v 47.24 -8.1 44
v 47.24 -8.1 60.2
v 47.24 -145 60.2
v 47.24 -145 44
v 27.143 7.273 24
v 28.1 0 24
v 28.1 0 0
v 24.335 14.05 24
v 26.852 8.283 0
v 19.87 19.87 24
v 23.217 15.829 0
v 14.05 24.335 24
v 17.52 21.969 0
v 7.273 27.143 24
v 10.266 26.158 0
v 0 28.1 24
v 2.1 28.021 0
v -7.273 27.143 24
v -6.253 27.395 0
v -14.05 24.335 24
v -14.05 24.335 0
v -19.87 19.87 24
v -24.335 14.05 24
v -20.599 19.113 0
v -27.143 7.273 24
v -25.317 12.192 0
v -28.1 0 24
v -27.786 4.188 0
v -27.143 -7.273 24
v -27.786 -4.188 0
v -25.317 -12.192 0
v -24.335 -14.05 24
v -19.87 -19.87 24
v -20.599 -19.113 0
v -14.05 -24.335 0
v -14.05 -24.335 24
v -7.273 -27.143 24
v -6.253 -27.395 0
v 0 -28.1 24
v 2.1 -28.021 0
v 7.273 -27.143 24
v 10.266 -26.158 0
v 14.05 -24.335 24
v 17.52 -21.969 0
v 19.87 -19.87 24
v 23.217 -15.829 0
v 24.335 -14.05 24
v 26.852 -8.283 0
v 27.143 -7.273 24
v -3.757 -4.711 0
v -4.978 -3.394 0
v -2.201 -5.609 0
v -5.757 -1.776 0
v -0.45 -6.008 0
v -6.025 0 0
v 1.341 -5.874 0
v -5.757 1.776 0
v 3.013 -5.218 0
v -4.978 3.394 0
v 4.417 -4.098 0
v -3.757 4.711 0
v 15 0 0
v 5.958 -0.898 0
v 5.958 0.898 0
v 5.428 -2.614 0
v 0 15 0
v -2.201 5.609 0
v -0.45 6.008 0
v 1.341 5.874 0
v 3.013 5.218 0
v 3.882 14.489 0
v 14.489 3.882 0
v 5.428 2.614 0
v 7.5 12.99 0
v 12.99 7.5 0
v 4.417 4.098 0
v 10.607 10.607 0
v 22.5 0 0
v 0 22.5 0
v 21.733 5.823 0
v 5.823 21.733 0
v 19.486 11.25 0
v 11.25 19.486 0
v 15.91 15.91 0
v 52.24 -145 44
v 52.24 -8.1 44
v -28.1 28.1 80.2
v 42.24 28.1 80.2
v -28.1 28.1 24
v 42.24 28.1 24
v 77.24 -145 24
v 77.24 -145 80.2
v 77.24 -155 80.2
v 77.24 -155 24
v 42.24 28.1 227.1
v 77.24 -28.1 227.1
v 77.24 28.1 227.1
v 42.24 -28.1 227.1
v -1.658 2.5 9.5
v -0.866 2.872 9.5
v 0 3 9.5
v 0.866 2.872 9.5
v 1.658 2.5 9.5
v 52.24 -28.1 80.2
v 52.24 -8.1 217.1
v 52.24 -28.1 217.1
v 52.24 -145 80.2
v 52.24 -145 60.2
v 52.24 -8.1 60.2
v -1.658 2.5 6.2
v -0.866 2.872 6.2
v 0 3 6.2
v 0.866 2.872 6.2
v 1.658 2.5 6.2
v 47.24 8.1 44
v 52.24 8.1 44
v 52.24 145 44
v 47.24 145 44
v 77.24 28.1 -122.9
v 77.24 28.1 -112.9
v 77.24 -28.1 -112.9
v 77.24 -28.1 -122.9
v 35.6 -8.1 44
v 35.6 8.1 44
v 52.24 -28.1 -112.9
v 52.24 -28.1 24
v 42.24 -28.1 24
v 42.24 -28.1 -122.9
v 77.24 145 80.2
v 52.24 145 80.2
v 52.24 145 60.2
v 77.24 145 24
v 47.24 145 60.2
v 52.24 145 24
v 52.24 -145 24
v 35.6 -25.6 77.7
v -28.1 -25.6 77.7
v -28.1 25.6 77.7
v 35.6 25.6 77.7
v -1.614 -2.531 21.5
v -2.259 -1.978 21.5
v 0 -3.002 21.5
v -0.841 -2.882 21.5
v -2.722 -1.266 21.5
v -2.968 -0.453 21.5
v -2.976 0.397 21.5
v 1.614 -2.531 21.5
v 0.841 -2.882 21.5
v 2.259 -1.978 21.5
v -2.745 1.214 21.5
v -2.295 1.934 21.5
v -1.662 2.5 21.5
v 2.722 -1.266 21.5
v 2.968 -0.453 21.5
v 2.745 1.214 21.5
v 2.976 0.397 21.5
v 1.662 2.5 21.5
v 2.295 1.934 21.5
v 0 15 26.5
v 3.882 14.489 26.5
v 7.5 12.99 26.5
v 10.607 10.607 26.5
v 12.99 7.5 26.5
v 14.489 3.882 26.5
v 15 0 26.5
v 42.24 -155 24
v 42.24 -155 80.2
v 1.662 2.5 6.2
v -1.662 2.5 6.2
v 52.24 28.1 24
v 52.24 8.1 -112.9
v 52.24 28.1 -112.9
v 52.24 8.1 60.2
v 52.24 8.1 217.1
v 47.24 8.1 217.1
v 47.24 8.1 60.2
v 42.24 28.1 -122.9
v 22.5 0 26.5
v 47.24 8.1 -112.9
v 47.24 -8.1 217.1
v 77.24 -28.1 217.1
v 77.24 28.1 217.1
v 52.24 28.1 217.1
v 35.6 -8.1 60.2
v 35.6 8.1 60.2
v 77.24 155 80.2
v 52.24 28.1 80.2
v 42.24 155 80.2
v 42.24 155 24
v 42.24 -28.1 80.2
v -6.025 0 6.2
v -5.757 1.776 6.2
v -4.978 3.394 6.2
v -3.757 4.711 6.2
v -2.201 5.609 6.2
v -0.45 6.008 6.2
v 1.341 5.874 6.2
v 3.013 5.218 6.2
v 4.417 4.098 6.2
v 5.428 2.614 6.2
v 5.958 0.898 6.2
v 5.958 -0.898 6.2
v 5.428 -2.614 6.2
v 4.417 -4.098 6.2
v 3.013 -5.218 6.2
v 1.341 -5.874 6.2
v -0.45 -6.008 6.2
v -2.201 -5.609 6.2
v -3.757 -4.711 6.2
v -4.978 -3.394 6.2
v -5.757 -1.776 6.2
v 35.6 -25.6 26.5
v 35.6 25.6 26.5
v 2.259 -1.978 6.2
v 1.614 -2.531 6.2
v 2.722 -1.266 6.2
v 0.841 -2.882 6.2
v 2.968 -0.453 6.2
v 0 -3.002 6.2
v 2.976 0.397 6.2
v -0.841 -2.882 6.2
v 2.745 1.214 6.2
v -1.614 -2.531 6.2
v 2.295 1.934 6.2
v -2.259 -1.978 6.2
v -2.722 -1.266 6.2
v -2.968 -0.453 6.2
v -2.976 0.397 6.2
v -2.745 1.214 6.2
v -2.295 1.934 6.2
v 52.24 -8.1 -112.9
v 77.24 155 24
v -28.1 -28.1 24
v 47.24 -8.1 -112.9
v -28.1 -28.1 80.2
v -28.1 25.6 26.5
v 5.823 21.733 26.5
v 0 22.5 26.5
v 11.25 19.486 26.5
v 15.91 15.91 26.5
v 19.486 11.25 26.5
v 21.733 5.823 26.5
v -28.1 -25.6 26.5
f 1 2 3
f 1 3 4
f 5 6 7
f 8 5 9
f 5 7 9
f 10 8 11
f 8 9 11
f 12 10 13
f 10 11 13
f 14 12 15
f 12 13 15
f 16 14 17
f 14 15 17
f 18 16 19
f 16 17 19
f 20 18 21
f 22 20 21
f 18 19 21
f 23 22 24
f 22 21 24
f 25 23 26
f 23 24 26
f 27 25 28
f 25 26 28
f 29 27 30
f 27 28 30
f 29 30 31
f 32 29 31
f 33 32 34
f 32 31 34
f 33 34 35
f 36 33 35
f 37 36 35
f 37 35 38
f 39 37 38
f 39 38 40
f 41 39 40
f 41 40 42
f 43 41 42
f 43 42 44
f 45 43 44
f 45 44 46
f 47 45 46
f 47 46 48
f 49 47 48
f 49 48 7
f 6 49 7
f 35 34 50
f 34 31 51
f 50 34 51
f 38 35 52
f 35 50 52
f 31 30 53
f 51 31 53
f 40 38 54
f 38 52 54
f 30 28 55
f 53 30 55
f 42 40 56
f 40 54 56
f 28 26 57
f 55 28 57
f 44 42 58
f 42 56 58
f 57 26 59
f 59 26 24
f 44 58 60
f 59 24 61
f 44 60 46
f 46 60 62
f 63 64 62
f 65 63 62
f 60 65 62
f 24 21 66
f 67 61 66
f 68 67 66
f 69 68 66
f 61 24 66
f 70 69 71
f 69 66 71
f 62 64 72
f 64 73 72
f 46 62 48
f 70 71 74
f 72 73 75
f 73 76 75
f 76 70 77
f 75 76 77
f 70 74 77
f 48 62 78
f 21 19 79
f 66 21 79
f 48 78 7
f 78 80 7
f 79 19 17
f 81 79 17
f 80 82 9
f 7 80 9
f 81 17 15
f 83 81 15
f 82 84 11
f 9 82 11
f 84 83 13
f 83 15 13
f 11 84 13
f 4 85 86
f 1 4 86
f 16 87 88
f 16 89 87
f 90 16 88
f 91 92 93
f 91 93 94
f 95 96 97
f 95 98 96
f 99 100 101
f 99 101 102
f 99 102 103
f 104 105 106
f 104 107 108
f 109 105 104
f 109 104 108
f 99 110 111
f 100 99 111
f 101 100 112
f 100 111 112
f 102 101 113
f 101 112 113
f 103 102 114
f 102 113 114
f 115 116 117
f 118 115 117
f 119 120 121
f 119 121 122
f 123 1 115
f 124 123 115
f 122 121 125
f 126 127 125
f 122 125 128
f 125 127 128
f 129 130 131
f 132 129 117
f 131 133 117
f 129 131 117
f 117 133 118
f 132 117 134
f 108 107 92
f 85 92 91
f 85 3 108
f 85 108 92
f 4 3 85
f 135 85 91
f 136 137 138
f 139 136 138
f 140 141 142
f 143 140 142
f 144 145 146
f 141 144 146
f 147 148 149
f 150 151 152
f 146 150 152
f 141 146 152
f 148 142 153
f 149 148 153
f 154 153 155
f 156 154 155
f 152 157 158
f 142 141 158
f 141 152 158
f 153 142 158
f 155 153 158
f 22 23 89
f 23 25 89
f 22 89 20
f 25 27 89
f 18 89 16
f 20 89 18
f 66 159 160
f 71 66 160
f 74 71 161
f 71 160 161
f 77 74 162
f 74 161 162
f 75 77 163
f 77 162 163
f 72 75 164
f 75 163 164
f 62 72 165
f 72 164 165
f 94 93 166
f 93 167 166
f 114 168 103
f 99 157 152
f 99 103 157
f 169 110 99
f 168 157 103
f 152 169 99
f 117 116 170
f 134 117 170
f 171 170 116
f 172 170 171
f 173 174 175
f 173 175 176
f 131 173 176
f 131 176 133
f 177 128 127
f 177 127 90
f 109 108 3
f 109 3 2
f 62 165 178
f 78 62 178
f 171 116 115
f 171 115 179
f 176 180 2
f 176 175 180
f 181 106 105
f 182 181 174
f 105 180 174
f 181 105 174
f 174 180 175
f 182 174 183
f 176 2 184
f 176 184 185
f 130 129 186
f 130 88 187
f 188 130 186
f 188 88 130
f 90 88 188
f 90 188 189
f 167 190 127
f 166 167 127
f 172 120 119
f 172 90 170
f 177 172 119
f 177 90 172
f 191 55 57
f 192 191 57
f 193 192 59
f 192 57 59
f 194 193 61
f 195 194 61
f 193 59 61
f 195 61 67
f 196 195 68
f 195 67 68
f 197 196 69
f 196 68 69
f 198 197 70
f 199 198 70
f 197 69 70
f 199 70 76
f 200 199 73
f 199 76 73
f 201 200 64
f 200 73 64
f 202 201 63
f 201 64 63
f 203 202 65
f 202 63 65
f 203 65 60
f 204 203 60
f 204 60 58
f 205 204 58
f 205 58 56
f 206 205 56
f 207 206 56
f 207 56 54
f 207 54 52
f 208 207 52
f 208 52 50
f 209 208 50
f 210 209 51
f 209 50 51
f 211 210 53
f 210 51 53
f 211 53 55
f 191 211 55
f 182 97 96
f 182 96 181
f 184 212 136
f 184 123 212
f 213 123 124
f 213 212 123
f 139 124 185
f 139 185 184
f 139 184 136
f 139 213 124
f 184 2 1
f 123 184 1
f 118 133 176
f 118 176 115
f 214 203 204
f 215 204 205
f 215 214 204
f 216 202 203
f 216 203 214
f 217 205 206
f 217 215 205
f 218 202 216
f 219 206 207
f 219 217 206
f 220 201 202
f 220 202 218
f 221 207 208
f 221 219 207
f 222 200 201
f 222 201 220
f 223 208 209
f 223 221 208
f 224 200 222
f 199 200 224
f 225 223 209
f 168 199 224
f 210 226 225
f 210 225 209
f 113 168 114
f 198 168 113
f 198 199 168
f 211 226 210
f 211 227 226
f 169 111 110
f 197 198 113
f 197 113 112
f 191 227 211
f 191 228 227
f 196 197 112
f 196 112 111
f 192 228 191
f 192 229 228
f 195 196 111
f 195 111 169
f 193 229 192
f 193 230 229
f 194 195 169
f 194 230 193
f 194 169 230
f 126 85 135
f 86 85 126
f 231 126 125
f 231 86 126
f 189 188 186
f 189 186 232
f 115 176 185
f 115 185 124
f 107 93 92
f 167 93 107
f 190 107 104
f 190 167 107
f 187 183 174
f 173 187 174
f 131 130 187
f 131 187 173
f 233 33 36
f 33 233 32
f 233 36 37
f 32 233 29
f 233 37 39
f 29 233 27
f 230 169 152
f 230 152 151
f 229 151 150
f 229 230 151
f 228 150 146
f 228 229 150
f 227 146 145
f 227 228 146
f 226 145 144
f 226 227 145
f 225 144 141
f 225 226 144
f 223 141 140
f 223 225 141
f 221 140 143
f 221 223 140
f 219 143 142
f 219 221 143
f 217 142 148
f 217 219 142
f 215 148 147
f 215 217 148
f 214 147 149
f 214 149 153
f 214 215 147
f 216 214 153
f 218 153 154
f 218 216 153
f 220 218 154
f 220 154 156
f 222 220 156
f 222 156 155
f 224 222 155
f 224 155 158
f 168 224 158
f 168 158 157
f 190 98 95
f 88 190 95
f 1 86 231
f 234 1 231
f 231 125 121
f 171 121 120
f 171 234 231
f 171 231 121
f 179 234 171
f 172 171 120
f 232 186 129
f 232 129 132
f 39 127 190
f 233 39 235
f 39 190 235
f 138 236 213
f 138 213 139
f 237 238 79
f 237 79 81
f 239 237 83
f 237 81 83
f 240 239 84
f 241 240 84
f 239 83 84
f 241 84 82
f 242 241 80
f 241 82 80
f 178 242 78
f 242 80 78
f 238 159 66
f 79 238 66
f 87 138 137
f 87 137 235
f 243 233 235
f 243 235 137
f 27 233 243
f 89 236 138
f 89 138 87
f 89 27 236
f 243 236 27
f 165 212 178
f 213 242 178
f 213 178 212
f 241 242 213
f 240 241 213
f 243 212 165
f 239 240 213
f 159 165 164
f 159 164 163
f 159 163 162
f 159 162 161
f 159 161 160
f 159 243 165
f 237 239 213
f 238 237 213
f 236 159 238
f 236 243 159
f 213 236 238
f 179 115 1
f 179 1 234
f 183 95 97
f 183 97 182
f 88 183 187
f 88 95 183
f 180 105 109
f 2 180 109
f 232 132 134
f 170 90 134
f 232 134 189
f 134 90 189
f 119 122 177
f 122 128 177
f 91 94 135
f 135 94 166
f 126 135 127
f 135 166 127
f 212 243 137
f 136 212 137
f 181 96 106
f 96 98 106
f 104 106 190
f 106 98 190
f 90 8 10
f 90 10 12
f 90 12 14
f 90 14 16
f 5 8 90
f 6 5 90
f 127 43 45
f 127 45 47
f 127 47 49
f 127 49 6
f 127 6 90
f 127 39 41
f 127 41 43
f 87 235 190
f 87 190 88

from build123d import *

# Parameters (mm, degrees)
SKETCH1_R            = 28.1
BOSS_EXTRUDE2_DEPTH  = 24
CUT_EXTRUDE2_DEPTH   = 21.5
SKETCH4_R            = 3
CUT_EXTRUDE3_DEPTH   = 9.5
SKETCH6_R            = 6.025
CUT_EXTRUDE4_DEPTH   = 6.2
SKETCH7_W            = 56.2
SKETCH7_H            = 56.2
BOSS_EXTRUDE3_DEPTH  = 56.2
SKETCH8_W            = 56.2
SKETCH8_H            = 56.2
BOSS_EXTRUDE4_DEPTH  = 14.14
SKETCH10_W           = 56.2
SKETCH10_H           = 56.2
BOSS_EXTRUDE5_DEPTH  = 10
SKETCH11_W           = 10
SKETCH11_H           = 56.2
BOSS_EXTRUDE6_DEPTH  = 146.9
SKETCH12_W           = 10
SKETCH12_H           = 56.2
BOSS_EXTRUDE7_DEPTH  = 126.9
SKETCH13_W           = 10
SKETCH13_H           = 56.2
BOSS_EXTRUDE8_DEPTH  = 146.9
SKETCH14_W           = 10
SKETCH14_H           = 56.2
BOSS_EXTRUDE9_DEPTH  = 126.9
SKETCH15_W           = 10
SKETCH15_H           = 56.2
BOSS_EXTRUDE10_DEPTH = 25
SKETCH16_W           = 10
SKETCH16_H           = 56.2
BOSS_EXTRUDE11_DEPTH = 25
SKETCH17_W           = 56.2
SKETCH17_H           = 10
BOSS_EXTRUDE12_DEPTH = 25
SKETCH18_W           = 56.2
SKETCH18_H           = 10
BOSS_EXTRUDE13_DEPTH = 25
SKETCH19_W           = 51.2
SKETCH19_H           = 51.2
CUT_EXTRUDE5_DEPTH   = 63.7
SKETCH23_W           = 330
SKETCH23_H           = 16.2
CUT_EXTRUDE7_DEPTH   = 5
SKETCH24_W           = 16.2
SKETCH24_H           = 290
CUT_EXTRUDE8_DEPTH   = 5
SKETCH25_W           = 16.2
SKETCH25_H           = 16.2
CUT_EXTRUDE12_DEPTH  = 25


with BuildPart() as part:
    # Sketch1 → Boss-Extrude2 (new body)
    with BuildSketch(Plane.XY):
        Circle(SKETCH1_R)
    extrude(amount=BOSS_EXTRUDE2_DEPTH)

    # Sketch3 → Cut-Extrude2 (cut)
    with BuildSketch(Plane(origin=(0, 0, 0), x_dir=(-1, 0, 0), z_dir=(0, 0, -1))):
        with BuildLine():
            Line((-1.661801922, 2.5), (1.661801922, 2.5))
            ThreePointArc((1.661801922, 2.5), (0, -3.001930317), (-1.661801922, 2.5))
        make_face()
    extrude(amount=-CUT_EXTRUDE2_DEPTH, mode=Mode.SUBTRACT)

    # Sketch4 → Cut-Extrude3 (cut)
    with BuildSketch(Plane(origin=(0, 0, 0), x_dir=(-1, 0, 0), z_dir=(0, 0, -1))):
        Circle(SKETCH4_R)
    extrude(amount=-CUT_EXTRUDE3_DEPTH, mode=Mode.SUBTRACT)

    # Sketch6 → Cut-Extrude4 (cut)
    with BuildSketch(Plane(origin=(0, 0, 0), x_dir=(-1, 0, 0), z_dir=(0, 0, -1))):
        Circle(SKETCH6_R)
    extrude(amount=-CUT_EXTRUDE4_DEPTH, mode=Mode.SUBTRACT)

    # Sketch7 → Boss-Extrude3 (add)
    with BuildSketch(Plane.XY.offset(24)):
        Rectangle(SKETCH7_W, SKETCH7_H)
    extrude(amount=BOSS_EXTRUDE3_DEPTH)

    # Sketch8 → Boss-Extrude4 (add)
    with BuildSketch(Plane(origin=(28.1, 0, 0), x_dir=(0, 0, -1), z_dir=(1, 0, 0))):
        with Locations((-52.1, 0)):
            Rectangle(SKETCH8_W, SKETCH8_H)
    extrude(amount=BOSS_EXTRUDE4_DEPTH)

    # Sketch10 → Boss-Extrude5 (add)
    with BuildSketch(Plane(origin=(42.24, 0, 0), x_dir=(0, 0, -1), z_dir=(1, 0, 0))):
        with Locations((-52.1, 0)):
            Rectangle(SKETCH10_W, SKETCH10_H)
    extrude(amount=BOSS_EXTRUDE5_DEPTH)

    # Sketch11 → Boss-Extrude6 (add)
    with BuildSketch(Plane.XY.offset(80.2)):
        with Locations((47.24, 0)):
            Rectangle(SKETCH11_W, SKETCH11_H)
    extrude(amount=BOSS_EXTRUDE6_DEPTH)

    # Sketch12 → Boss-Extrude7 (add)
    with BuildSketch(Plane(origin=(0, 28.1, 0), x_dir=(1, 0, 0), z_dir=(0, 1, 0))):
        with Locations((47.24, -52.1)):
            Rectangle(SKETCH12_W, SKETCH12_H)
    extrude(amount=BOSS_EXTRUDE7_DEPTH)

    # Sketch13 → Boss-Extrude8 (add)
    with BuildSketch(Plane(origin=(0, 0, 24), x_dir=(-1, 0, 0), z_dir=(0, 0, -1))):
        with Locations((-47.24, 0)):
            Rectangle(SKETCH13_W, SKETCH13_H)
    extrude(amount=BOSS_EXTRUDE8_DEPTH)

    # Sketch14 → Boss-Extrude9 (add)
    with BuildSketch(Plane(origin=(0, -28.1, 0), x_dir=(-1, 0, 0), z_dir=(0, -1, 0))):
        with Locations((-47.24, -52.1)):
            Rectangle(SKETCH14_W, SKETCH14_H)
    extrude(amount=BOSS_EXTRUDE9_DEPTH)

    # Sketch15 → Boss-Extrude10 (add)
    with BuildSketch(Plane(origin=(52.24, 0, 0), x_dir=(0, 0, -1), z_dir=(1, 0, 0))):
        with Locations((-222.1, 0)):
            Rectangle(SKETCH15_W, SKETCH15_H)
    extrude(amount=BOSS_EXTRUDE10_DEPTH)

    # Sketch16 → Boss-Extrude11 (add)
    with BuildSketch(Plane(origin=(52.24, 0, 0), x_dir=(0, 0, -1), z_dir=(1, 0, 0))):
        with Locations((117.9, 0)):
            Rectangle(SKETCH16_W, SKETCH16_H)
    extrude(amount=BOSS_EXTRUDE11_DEPTH)

    # Sketch17 → Boss-Extrude12 (add)
    with BuildSketch(Plane(origin=(52.24, 0, 0), x_dir=(0, 0, -1), z_dir=(1, 0, 0))):
        with Locations((-52.1, 150)):
            Rectangle(SKETCH17_W, SKETCH17_H)
    extrude(amount=BOSS_EXTRUDE12_DEPTH)

    # Sketch18 → Boss-Extrude13 (add)
    with BuildSketch(Plane(origin=(52.24, 0, 0), x_dir=(0, 0, -1), z_dir=(1, 0, 0))):
        with Locations((-52.1, -150)):
            Rectangle(SKETCH18_W, SKETCH18_H)
    extrude(amount=BOSS_EXTRUDE13_DEPTH)

    # Sketch19 → Cut-Extrude5 (cut)
    with BuildSketch(Plane.ZY.offset(28.1)):
        with Locations((52.1, 0)):
            Rectangle(SKETCH19_W, SKETCH19_H)
    extrude(amount=-CUT_EXTRUDE5_DEPTH, mode=Mode.SUBTRACT)

    # Cut-Sweep2: sweep along a path in Sketch20
    with BuildLine(Plane(origin=(0, 0, 0), x_dir=(-1, 0, 0), z_dir=(0, 0, -1))) as cut_sweep2_path:
        ThreePointArc((0, 15), (-10.606601718, 10.606601718), (-15, 0))
    # 3DSketch2 → Cut-Sweep2 (sweep, cut)
    with BuildSketch(Plane(origin=(0, 15, 0), x_dir=(0, 0.17521220324553322, 0.9845306921746249), z_dir=(-1, 0, 0))):
        Polygon((0, 0), (1.314091524, 7.383980191), (42.805237655, 0), (41.491146131, -7.383980191), align=None)
    sweep(path=cut_sweep2_path.line, mode=Mode.SUBTRACT)

    # Sketch23 → Cut-Extrude7 (cut)
    with BuildSketch(Plane(origin=(52.24, 0, 0), x_dir=(0, 0, -1), z_dir=(1, 0, 0))):
        with Locations((-52.1, 0)):
            Rectangle(SKETCH23_W, SKETCH23_H)
    extrude(amount=-CUT_EXTRUDE7_DEPTH, mode=Mode.SUBTRACT)

    # Sketch24 → Cut-Extrude8 (cut)
    with BuildSketch(Plane(origin=(52.24, 0, 0), x_dir=(0, 0, -1), z_dir=(1, 0, 0))):
        with Locations((-52.1, 0)):
            Rectangle(SKETCH24_W, SKETCH24_H)
    extrude(amount=-CUT_EXTRUDE8_DEPTH, mode=Mode.SUBTRACT)

    # Sketch25 → Cut-Extrude12 (cut)
    with BuildSketch(Plane(origin=(47.24, 0, 0), x_dir=(0, 0, -1), z_dir=(1, 0, 0))):
        with Locations((-52.1, 0)):
            Rectangle(SKETCH25_W, SKETCH25_H)
    extrude(amount=-CUT_EXTRUDE12_DEPTH, mode=Mode.SUBTRACT)


solid = part.part
